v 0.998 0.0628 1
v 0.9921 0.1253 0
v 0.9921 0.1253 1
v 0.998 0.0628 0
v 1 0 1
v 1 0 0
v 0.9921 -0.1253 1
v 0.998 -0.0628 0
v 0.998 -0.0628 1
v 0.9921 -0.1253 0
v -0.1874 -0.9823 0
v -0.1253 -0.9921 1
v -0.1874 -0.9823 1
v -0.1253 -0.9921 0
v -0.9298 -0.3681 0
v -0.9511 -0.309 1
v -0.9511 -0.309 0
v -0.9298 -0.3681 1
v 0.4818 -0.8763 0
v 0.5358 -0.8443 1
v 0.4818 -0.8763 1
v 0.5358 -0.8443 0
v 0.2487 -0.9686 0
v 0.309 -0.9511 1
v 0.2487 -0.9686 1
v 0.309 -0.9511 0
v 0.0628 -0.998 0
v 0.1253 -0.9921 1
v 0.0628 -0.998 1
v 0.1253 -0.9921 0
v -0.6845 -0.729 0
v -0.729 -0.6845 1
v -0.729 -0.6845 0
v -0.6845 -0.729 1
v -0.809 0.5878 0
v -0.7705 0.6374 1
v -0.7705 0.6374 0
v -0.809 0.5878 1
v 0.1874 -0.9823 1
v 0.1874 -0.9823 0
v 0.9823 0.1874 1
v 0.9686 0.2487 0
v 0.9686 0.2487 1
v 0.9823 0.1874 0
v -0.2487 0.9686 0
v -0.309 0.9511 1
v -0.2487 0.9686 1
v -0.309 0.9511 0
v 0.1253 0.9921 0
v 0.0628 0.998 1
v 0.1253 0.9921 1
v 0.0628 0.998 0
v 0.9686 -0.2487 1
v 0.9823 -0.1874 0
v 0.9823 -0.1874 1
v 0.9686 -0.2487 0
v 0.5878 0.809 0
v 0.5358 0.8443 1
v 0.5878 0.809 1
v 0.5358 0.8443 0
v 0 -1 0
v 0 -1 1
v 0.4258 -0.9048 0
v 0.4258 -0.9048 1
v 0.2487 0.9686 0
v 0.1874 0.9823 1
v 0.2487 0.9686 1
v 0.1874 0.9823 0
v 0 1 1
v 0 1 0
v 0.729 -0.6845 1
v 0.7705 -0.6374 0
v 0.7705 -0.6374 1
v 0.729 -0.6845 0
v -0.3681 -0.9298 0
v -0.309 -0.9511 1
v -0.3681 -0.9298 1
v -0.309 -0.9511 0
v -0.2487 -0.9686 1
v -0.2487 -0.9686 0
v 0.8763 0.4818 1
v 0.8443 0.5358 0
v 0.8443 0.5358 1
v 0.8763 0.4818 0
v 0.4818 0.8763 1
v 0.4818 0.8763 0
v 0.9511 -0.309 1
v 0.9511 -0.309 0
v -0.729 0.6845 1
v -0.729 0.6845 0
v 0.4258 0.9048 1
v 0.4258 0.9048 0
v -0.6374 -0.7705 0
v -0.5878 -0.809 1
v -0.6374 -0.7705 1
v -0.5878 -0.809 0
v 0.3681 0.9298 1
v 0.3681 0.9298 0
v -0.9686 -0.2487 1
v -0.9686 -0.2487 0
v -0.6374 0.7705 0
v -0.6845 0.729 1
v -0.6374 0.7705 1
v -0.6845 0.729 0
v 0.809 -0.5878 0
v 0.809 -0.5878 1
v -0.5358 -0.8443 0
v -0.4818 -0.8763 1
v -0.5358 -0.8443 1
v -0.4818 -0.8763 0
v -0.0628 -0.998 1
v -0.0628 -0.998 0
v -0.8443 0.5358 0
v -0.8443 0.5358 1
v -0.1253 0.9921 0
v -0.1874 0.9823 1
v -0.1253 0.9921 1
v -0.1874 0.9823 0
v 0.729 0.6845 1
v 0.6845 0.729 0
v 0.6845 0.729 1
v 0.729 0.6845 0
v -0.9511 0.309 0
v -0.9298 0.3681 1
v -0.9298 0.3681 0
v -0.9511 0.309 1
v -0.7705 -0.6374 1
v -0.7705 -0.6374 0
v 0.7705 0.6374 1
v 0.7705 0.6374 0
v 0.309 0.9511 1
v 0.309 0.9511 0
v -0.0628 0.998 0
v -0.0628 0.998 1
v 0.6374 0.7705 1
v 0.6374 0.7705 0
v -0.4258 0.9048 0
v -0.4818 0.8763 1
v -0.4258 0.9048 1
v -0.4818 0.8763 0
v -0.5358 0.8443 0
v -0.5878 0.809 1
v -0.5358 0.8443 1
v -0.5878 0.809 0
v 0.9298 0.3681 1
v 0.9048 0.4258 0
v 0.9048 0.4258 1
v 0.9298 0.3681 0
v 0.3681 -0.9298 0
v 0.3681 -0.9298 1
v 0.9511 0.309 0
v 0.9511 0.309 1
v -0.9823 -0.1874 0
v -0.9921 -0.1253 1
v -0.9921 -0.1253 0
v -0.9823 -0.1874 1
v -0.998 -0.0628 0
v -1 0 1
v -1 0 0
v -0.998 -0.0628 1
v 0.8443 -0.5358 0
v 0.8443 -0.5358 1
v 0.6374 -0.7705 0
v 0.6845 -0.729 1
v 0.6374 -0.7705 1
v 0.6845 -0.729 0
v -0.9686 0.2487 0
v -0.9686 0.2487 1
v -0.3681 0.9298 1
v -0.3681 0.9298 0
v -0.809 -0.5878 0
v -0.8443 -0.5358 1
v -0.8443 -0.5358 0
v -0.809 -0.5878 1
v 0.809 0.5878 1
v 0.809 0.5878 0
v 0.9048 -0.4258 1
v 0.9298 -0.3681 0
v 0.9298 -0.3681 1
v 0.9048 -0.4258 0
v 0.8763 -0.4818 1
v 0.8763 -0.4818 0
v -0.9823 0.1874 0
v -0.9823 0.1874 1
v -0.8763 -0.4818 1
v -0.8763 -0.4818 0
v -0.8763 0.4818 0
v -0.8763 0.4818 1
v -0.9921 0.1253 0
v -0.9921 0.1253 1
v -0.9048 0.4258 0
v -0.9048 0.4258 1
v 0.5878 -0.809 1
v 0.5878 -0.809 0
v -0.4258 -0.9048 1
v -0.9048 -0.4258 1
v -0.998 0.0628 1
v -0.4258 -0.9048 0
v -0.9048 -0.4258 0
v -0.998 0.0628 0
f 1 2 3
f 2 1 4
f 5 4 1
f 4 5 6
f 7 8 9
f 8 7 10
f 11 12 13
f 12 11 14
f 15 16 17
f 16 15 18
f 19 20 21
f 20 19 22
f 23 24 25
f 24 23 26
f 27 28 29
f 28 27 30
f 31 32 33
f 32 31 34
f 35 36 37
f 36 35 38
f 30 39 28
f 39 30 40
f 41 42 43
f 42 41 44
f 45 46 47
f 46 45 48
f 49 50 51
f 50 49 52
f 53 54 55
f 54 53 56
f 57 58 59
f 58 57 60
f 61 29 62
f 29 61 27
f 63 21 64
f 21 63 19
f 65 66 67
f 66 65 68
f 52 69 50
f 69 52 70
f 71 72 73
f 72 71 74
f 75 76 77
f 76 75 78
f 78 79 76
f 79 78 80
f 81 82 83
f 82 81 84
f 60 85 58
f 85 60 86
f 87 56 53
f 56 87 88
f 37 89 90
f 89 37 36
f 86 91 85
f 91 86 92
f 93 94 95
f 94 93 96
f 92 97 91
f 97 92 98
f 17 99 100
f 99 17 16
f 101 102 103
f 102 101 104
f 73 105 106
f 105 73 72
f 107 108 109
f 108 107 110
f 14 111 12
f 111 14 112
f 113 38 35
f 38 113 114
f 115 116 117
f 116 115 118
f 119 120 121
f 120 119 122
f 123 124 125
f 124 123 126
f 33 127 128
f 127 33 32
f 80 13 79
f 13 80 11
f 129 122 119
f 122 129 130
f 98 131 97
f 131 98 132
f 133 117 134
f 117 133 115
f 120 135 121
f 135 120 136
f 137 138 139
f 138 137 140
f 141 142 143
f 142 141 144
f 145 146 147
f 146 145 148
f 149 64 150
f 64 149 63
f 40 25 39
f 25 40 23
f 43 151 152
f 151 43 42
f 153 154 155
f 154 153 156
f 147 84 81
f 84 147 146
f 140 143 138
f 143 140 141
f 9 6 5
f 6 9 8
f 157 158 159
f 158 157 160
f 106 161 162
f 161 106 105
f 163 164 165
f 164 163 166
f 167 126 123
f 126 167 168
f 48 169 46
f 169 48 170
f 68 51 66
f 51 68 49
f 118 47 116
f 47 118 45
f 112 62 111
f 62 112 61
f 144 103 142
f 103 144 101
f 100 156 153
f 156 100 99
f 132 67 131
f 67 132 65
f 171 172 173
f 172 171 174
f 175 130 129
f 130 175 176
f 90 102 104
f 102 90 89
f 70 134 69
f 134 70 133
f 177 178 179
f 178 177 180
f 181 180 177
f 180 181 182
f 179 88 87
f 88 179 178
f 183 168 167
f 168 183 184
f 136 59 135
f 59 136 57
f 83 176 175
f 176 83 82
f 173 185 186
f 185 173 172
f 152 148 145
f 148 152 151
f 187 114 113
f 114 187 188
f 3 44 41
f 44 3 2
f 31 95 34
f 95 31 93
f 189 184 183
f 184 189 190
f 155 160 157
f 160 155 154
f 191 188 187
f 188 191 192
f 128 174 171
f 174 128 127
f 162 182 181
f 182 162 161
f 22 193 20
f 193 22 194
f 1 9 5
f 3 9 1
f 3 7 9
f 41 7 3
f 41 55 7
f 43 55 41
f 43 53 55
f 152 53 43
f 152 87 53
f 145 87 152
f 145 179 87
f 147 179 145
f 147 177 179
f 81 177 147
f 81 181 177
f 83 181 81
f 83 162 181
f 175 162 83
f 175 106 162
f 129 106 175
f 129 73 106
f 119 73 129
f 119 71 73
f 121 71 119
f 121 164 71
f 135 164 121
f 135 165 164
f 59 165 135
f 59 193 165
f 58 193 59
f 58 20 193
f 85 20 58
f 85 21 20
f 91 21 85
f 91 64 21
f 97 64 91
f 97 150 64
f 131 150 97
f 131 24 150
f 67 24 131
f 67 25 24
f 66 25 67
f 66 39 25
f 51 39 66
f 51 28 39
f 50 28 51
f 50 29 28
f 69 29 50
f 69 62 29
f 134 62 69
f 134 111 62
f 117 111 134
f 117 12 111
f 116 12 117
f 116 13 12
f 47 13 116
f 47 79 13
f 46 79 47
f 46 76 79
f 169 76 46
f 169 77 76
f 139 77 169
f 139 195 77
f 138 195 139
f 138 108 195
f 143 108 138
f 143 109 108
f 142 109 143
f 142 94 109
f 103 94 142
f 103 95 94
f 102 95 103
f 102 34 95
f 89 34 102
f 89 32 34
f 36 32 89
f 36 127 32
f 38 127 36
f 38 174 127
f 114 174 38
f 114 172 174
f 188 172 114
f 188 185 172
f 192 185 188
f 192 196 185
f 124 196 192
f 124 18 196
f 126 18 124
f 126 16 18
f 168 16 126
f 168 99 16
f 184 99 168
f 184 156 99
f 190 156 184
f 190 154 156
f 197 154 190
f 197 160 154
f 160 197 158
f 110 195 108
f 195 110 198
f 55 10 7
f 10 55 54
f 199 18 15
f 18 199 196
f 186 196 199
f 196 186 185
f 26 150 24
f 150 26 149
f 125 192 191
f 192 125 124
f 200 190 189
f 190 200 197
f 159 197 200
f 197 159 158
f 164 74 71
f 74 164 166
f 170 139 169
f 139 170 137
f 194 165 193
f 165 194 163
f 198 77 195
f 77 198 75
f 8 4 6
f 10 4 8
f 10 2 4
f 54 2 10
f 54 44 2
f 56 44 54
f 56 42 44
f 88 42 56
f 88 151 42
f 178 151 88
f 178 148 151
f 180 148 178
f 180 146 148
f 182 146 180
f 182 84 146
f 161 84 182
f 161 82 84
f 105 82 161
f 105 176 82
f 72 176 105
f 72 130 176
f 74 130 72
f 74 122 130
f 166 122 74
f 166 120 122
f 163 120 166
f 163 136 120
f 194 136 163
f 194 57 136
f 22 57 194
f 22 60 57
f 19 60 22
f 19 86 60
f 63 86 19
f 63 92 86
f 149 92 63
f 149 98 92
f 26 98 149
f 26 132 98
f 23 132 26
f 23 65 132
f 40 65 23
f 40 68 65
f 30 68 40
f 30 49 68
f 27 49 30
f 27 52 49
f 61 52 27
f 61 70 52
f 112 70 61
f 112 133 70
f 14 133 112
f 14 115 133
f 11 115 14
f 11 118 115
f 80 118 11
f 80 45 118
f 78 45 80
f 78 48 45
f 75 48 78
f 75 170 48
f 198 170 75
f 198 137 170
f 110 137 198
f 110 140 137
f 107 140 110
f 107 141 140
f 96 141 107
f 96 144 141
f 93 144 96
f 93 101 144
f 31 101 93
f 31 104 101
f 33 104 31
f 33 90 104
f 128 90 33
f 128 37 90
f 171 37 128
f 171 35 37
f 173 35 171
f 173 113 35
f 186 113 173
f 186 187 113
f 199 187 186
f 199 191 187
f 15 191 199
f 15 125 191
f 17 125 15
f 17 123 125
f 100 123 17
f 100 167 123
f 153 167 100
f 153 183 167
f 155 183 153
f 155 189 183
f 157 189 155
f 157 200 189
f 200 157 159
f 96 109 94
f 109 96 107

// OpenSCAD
// file: ../SRC/polyScrewThread_r1.scad
/*
 *    polyScrewThread_r1.scad    by aubenc @ Thingiverse
 *
 * This script contains the library modules that can be used to generate
 * threaded rods, screws and nuts.
 *
 * http://www.thingiverse.com/thing:8796
 *
 * CC Public Domain
 */


/* Example:
 * Just a 100mm long threaded rod.
 *
 * screw_thread(15,   // Outer diameter of the thread
 *               4,   // Step, traveling length per turn, also, tooth height, whatever...
 *              55,   // Degrees for the shape of the tooth 
 *                       (XY plane = 0, Z = 90, btw, 0 and 90 will/should not work...)
 *             100,   // Length (Z) of the tread
 *            PI/2,   // Resolution, one face each "PI/2" mm of the perimeter, 
 *               0);  // Countersink style:
 *                         -2 - Not even flat ends
 *                         -1 - Bottom (countersink'd and top flat)
 *                          0 - None (top and bottom flat)
 *                          1 - Top (bottom flat)
 *                          2 - Both (countersink'd)
 */
module screw_thread(od,st,lf0,lt,rs,cs)
{
    or=od/2;
    ir=or-st/2*cos(lf0)/sin(lf0);
    pf=2*PI*or;
    sn=floor(pf/rs);
    lfxy=360/sn;
    ttn=round(lt/st+1);
    zt=st/sn;

    intersection()
    {
        if (cs >= -1)
        {
           thread_shape(cs,lt,or,ir,sn,st);
        }

        full_thread(ttn,st,sn,zt,lfxy,or,ir);
    }
}

/* Example.
 * A nut for the thread rod example.
 *
 * hexa_nut(24,  // Distance between flats
 *           8,  // Height 
 *           4,  // Step height (the half will be used to countersink the ends)
 *          55,  // Degrees (same as used for the screw_thread example)
 *          15,  // Outer diameter of the thread to match
 *         0.5)  // Resolution, you may want to set this to small values
 *                  (quite high res) to minimize overhang issues
 *
 */
module hex_nut(df,hg,sth,clf,cod,crs)
{

    difference()
    {
        hex_head(hg,df);

        hex_countersink_ends(sth/2,cod,clf,crs,hg);

        screw_thread(cod,sth,clf,hg,crs,-2);
    }
}


module hex_screw(od,st,lf0,lt,rs,cs,df,hg,ntl,ntd)
{
    ntr=od/2-(st/2)*cos(lf0)/sin(lf0);

    union()
    {
        hex_head(hg,df);

        translate([0,0,hg])
        if ( ntl == 0 )
        {
            cylinder(h=0.01, r=ntr, center=true);
        }
        else
        {
            if ( ntd == -1 )
            {
                cylinder(h=ntl+0.01, r=ntr, $fn=floor(od*PI/rs), center=false);
            }
            else if ( ntd == 0 )
            {
                union()
                {
                    cylinder(h=ntl-st/2,
                             r=od/2, $fn=floor(od*PI/rs), center=false);

                    translate([0,0,ntl-st/2])
                    cylinder(h=st/2,
                             r1=od/2, r2=ntr, 
                             $fn=floor(od*PI/rs), center=false);
                }
            }
            else
            {
                cylinder(h=ntl, r=ntd/2, $fn=ntd*PI/rs, center=false);
            }
        }

        translate([0,0,ntl+hg]) screw_thread(od,st,lf0,lt,rs,cs);
    }
}

module hex_screw_0(od,st,lf0,lt,rs,cs,df,hg,ntl,ntd)
{
    ntr=od/2-(st/2)*cos(lf0)/sin(lf0);

    union()
    {
        hex_head_0(hg,df);

        translate([0,0,hg])
        if ( ntl == 0 )
        {
            cylinder(h=0.01, r=ntr, center=true);
        }
        else
        {
            if ( ntd == -1 )
            {
                cylinder(h=ntl+0.01, r=ntr, $fn=floor(od*PI/rs), center=false);
            }
            else if ( ntd == 0 )
            {
                union()
                {
                    cylinder(h=ntl-st/2,
                             r=od/2, $fn=floor(od*PI/rs), center=false);

                    translate([0,0,ntl-st/2])
                    cylinder(h=st/2,
                             r1=od/2, r2=ntr, 
                             $fn=floor(od*PI/rs), center=false);
                }
            }
            else
            {
                cylinder(h=ntl, r=ntd/2, $fn=ntd*PI/rs, center=false);
            }
        }

        translate([0,0,ntl+hg]) screw_thread(od,st,lf0,lt,rs,cs);
    }
}

module thread_shape(cs,lt,or,ir,sn,st)
{
    if ( cs == 0 )
    {
        cylinder(h=lt, r=or, $fn=sn, center=false);
    }
    else
    {
        union()
        {
            translate([0,0,st/2])
              cylinder(h=lt-st+0.005, r=or, $fn=sn, center=false);

            if ( cs == -1 || cs == 2 )
            {
                cylinder(h=st/2, r1=ir, r2=or, $fn=sn, center=false);
            }
            else
            {
                cylinder(h=st/2, r=or, $fn=sn, center=false);
            }

            translate([0,0,lt-st/2])
            if ( cs == 1 || cs == 2 )
            {
                  cylinder(h=st/2, r1=or, r2=ir, $fn=sn, center=false);
            }
            else
            {
                cylinder(h=st/2, r=or, $fn=sn, center=false);
            }
        }
    }
}

module full_thread(ttn,st,sn,zt,lfxy,or,ir)
{
  if(ir >= 0.2)
  {
    for(i=[0:ttn-1])
    {
        for(j=[0:sn-1])
			assign( pt = [	[0,                  0,                  i*st-st            ],
                        [ir*cos(j*lfxy),     ir*sin(j*lfxy),     i*st+j*zt-st       ],
                        [ir*cos((j+1)*lfxy), ir*sin((j+1)*lfxy), i*st+(j+1)*zt-st   ],
								[0,0,i*st],
                        [or*cos(j*lfxy),     or*sin(j*lfxy),     i*st+j*zt-st/2     ],
                        [or*cos((j+1)*lfxy), or*sin((j+1)*lfxy), i*st+(j+1)*zt-st/2 ],
                        [ir*cos(j*lfxy),     ir*sin(j*lfxy),     i*st+j*zt          ],
                        [ir*cos((j+1)*lfxy), ir*sin((j+1)*lfxy), i*st+(j+1)*zt      ],
                        [0,                  0,                  i*st+st            ]	])
        {
            polyhedron(points=pt,
              		  triangles=[	[1,0,3],[1,3,6],[6,3,8],[1,6,4],
											[0,1,2],[1,4,2],[2,4,5],[5,4,6],[5,6,7],[7,6,8],
											[7,8,3],[0,2,3],[3,2,7],[7,2,5]	]);
        }
    }
  }
  else
  {
    echo("Step Degrees too agresive, the thread will not be made!!");
    echo("Try to increase de value for the degrees and/or...");
    echo(" decrease the pitch value and/or...");
    echo(" increase the outer diameter value.");
  }
}

module hex_head(hg,df)
{
	rd0=df/2/sin(60);
	x0=0;	x1=df/2;	x2=x1+hg/2;
	y0=0;	y1=hg/2;	y2=hg;

	intersection()
	{
	   cylinder(h=hg, r=rd0, $fn=6, center=false);

		rotate_extrude(convexity=10, $fn=6*round(df*PI/6/0.5))
		polygon([ [x0,y0],[x1,y0],[x2,y1],[x1,y2],[x0,y2] ]);
	}
}

module hex_head_0(hg,df)
{
    cylinder(h=hg, r=df/2/sin(60), $fn=6, center=false);
}

module hex_countersink_ends(chg,cod,clf,crs,hg)
{
    translate([0,0,-0.1])
    cylinder(h=chg+0.01, 
             r1=cod/2, 
             r2=cod/2-(chg+0.1)*cos(clf)/sin(clf),
             $fn=floor(cod*PI/crs), center=false);

    translate([0,0,hg-chg+0.1])
    cylinder(h=chg+0.01, 
             r1=cod/2-(chg+0.1)*cos(clf)/sin(clf),
             r2=cod/2, 
             $fn=floor(cod*PI/crs), center=false);
}
// file: ../SRC/WINDGAUGE02A_S01.scad
$fn=40; // model faces resolution.
include <../configuration.scad>

include <polyScrewThread_r1.scad>

PI=3.141592;

S01_vyska=80;
S01_prumer_vnitrni=30;
S01_sila_materialu=2;
S01_vyska_horni_zavit=10;
S01_vyska_spodniho_zavitu=10;
S01_sila_drzaku_RJ11=2;


module WINDGAUGE02A_S01(S01_vyska,S01_prumer_vnitrni,S01_sila_materialu)
    {
        
         difference()
        {
            
union() 
 {           
//základní válec
cylinder (h = S01_vyska-S01_vyska_horni_zavit, r=(S01_prumer_vnitrni)/2+S01_sila_materialu, $fn=100);

//horní závit
     translate([0,0,S01_vyska-S01_vyska_horni_zavit])
screw_thread((S01_prumer_vnitrni+2*S01_sila_materialu),S01_hloubka_zavitu,55,S01_vyska_horni_zavit,PI/2,2);     

}

//vystouplá část
translate([0,0,S01_vyska_spodniho_zavitu+S01_sila_drzaku_RJ11-0.3])
cylinder (h = S01_sila_drzaku_RJ11, r=(S01_prumer_vnitrni)/2-1-S01_hloubka_zavitu/2, $fn=100);
//otvor na drzak rj11            
translate([0,0,S01_vyska_spodniho_zavitu])
cylinder (h = S01_sila_drzaku_RJ11-0.3, r=(S01_prumer_vnitrni)/2-S01_hloubka_zavitu/2, $fn=100);            

//spodní závit
screw_thread((S01_prumer_vnitrni),S01_hloubka_zavitu,55,S01_vyska_spodniho_zavitu+0.01,PI/2,2); 

//otvor skrz
            translate([0,0,S01_vyska_spodniho_zavitu+2*S01_sila_drzaku_RJ11-0.3])
cylinder (h = S01_vyska, r=(S01_prumer_vnitrni)/2-1, $fn=100);
} 
} 


WINDGAUGE02A_S01(S01_vyska,S01_prumer_vnitrni,S01_sila_materialu);









/*
module WINDGAUGE02A_S01(R02_vzdalenost_mezi_uchyty_lopatek,L01_sila_zapusteni_drzaku,L01_hloubka_zapusteni,S01_vyska_zuzene_casti,S01_vyska_na_elektroniku,S01_vyska_zavitu_na_nasroubovani_drzaku,S01_vyska_prechodu,vule_mezi_statorem_rotorem,S01_vyska_zavitu_na_nasroubovani_drzaku,S01_sila_materialu)
    {
        
//zuzena cas komponentu        
                
 translate([0,0,(S01_vyska_na_elektroniku+S01_vyska_zavitu_na_nasroubovani_drzaku+2*S01_vyska_komponentu_na_lozisko+S01_vyska_zuzene_casti)/2+S01_vyska_prechodu])
        
        difference()
        {
        cylinder (h = S01_vyska_zuzene_casti, r=(R02_vzdalenost_mezi_uchyty_lopatek+2*L01_sila_zapusteni_drzaku+2*L01_hloubka_zapusteni+2*vule_mezi_statorem_rotorem+2*S01_sila_materialu)/2, center = true, $fn=100); 
 
            translate([0,0,-S01_vyska_zuzene_casti/2+S01_vyska_zuzene_casti-R02_sila_mateiralu_pod_lopatkami-S01_vyska_komponentu_na_lozisko])
            
      screw_thread((R02_vzdalenost_mezi_uchyty_lopatek+2*L01_sila_zapusteni_drzaku+2*L01_hloubka_zapusteni+2*vule_mezi_statorem_rotorem),S01_hloubka_zavitu,55,S01_vyska_zuzene_casti+0.01,PI/2,2); 
            
           translate([0,0,-(S01_vyska_zuzene_casti/2)+(S01_vyska_zuzene_casti-R02_sila_mateiralu_pod_lopatkami-S01_vyska_komponentu_na_lozisko)/2])  
    cylinder (h = S01_vyska_zuzene_casti-R02_sila_mateiralu_pod_lopatkami-S01_vyska_komponentu_na_lozisko+0.01, r=(R02_vzdalenost_mezi_uchyty_lopatek+2*L01_sila_zapusteni_drzaku+2*L01_hloubka_zapusteni+2*vule_mezi_statorem_rotorem)/2, center = true, $fn=100); 
   

       //translate([0,0,(stator3_vyska-stator3_vyska_prekryti)/2])    
           
    
            }   

 difference()
        {
          
translate([0,0,(S01_vyska_na_elektroniku+S01_vyska_zavitu_na_nasroubovani_drzaku+2*S01_vyska_komponentu_na_lozisko+S01_vyska_prechodu)/2]) 
            
 cylinder(h=S01_vyska_prechodu,r1=(S01_prumer_zavitu+2*S01_sila_materialu)/2, r2=(R02_vzdalenost_mezi_uchyty_lopatek+2*L01_sila_zapusteni_drzaku+2*L01_hloubka_zapusteni+2*vule_mezi_statorem_rotorem+2*S01_sila_materialu)/2, center=true); 
          
          
 translate([0,0,(S01_vyska_na_elektroniku+S01_vyska_zavitu_na_nasroubovani_drzaku+2*S01_vyska_komponentu_na_lozisko+S01_vyska_prechodu)/2]) 
            
 cylinder(h=S01_vyska_prechodu,r1=(S01_prumer_zavitu)/2, r2=(R02_vzdalenost_mezi_uchyty_lopatek+2*L01_sila_zapusteni_drzaku+2*L01_hloubka_zapusteni+2*vule_mezi_statorem_rotorem)/2, center=true);          
          
          
            
 } 


  //spodni cast se zavitem          

 difference()
        {
        cylinder (h = S01_vyska_na_elektroniku+S01_vyska_zavitu_na_nasroubovani_drzaku+2*S01_vyska_komponentu_na_lozisko, r=(S01_prumer_zavitu+2*S01_sila_materialu)/2, center = true, $fn=100); 
 
            translate([0,0,-(S01_vyska_na_elektroniku+S01_vyska_zavitu_na_nasroubovani_drzaku+2*S01_vyska_komponentu_na_lozisko)/2])
      // metric_thread (diameter=S01_prumer_zavitu, pitch=1, length=S01_vyska_na_elektroniku+S01_vyska_zavitu_na_nasroubovani_drzaku+2*S01_vyska_komponentu_na_lozisko+0.01, internal=true, n_starts=6);     
   
 screw_thread(S01_prumer_zavitu,4,55,S01_vyska_na_elektroniku+S01_vyska_zavitu_na_nasroubovani_drzaku+2*S01_vyska_komponentu_na_lozisko+0.01,PI/2,2);          
    
            }

} 
*/ 



    

    
    
// file: ../configuration.scad
$fn=40; // model faces resolution.

//OBECNE PARAMETRY 
//----------------------------------------------------------------
//----------------------------------------------------------------
//WINDGAUGE02A_S02 - Parametry pro hlavni valec anemometru
S01_hloubka_zavitu=4;
S01_vyska=80; //80
S01_prumer_vnitrni=40;
S01_sila_materialu=1.3;
S01_vyska_horni_zavit=10;
S01_vyska_spodniho_zavitu=10;
S01_sila_drzaku_RJ11=3; //vyška drážky
S01_hrana_A_RJ11=12.3;
S01_hrana_B_RJ11=19;
S01_tolerance_zavit=1.5;

//Obecné parametry
prumer_osicky=5.1;

//Rozmery modulu se senzorem
senzor_delka=20.32;
senzor_sirka=10.16;
senzor_vyska_IO=2;
senzor_odstup_od_magnetu=2;

//Parametry loziska
lozisko_prumer_vnitrni=4.9;
lozisko_prumer_vnejsi=16.1;
lozisko_vyska=5;
lozisko_prekryv=1.5;

//Parametry magnetu
magnet_prumer=6.3;
magnet_vyska=5;
magnet_zapusteni=4;
magnet_tolerance_prumeru=0.2;

//Parametry sroubu
prumer_sroubu=3.4;
prumer_hlavy_sroubu=6;
vyska_hlavy_sroubu=4;
vyska_matky=3;
sirka_matky=6.7;

sirka_matky_tol=0.175;
prumer_orechu=10;

//WINDGAUGE02A_R01 //pro lopatku
L01_hrana_drzaku_a=10;
L01_hrana_drzaku_b=3;
L01_delka_uchytu=19;
L01_prumer_lopatky=40;
L01_sila_materialu_lopatky=0.9;

//WINDGAUGE02A_D01 //uchyt velky
D01_material_pod_zavitem=5;
D01_material_za_zavitem=3;
D01_material_pred_zavitem=2;
D01_delka_tyce=60;
D01_sirka_tyce=10;

//WINDGAUGE02A_D02 //uchyt na sloup
D02_sila_materialu=5;
D02_vyska_uchytky=40;
D02_prumer_obruby=27; //3/4 trubka
D02_delka_celeho_uchytu=60;
D02_dotahova_vzdalenost=1.5;
D02_prumer_uchytneho_sroubu=4.2;
D02_sirka_matky=9.1; //pro M4
D02_vyska_matky=3;

//WINDGAUGE02A_R01 //rotor s prekritim statoru
R01_vyska_preryti_statoru=10;
R01_sila_materialu_pro_prekriti=1.3;
R01_mezera_mezi_statorem_rotorem=3;

//WINDGAUGE02A_R03 //drzak magnetu
R05_sirka_matky=10;
// main file
$fn=100; // model faces resolution.
include <../configuration.scad>

use <../SRC/WINDGAUGE02A_S01.scad>


translate([0,0,0])


WINDGAUGE02A_S01();
